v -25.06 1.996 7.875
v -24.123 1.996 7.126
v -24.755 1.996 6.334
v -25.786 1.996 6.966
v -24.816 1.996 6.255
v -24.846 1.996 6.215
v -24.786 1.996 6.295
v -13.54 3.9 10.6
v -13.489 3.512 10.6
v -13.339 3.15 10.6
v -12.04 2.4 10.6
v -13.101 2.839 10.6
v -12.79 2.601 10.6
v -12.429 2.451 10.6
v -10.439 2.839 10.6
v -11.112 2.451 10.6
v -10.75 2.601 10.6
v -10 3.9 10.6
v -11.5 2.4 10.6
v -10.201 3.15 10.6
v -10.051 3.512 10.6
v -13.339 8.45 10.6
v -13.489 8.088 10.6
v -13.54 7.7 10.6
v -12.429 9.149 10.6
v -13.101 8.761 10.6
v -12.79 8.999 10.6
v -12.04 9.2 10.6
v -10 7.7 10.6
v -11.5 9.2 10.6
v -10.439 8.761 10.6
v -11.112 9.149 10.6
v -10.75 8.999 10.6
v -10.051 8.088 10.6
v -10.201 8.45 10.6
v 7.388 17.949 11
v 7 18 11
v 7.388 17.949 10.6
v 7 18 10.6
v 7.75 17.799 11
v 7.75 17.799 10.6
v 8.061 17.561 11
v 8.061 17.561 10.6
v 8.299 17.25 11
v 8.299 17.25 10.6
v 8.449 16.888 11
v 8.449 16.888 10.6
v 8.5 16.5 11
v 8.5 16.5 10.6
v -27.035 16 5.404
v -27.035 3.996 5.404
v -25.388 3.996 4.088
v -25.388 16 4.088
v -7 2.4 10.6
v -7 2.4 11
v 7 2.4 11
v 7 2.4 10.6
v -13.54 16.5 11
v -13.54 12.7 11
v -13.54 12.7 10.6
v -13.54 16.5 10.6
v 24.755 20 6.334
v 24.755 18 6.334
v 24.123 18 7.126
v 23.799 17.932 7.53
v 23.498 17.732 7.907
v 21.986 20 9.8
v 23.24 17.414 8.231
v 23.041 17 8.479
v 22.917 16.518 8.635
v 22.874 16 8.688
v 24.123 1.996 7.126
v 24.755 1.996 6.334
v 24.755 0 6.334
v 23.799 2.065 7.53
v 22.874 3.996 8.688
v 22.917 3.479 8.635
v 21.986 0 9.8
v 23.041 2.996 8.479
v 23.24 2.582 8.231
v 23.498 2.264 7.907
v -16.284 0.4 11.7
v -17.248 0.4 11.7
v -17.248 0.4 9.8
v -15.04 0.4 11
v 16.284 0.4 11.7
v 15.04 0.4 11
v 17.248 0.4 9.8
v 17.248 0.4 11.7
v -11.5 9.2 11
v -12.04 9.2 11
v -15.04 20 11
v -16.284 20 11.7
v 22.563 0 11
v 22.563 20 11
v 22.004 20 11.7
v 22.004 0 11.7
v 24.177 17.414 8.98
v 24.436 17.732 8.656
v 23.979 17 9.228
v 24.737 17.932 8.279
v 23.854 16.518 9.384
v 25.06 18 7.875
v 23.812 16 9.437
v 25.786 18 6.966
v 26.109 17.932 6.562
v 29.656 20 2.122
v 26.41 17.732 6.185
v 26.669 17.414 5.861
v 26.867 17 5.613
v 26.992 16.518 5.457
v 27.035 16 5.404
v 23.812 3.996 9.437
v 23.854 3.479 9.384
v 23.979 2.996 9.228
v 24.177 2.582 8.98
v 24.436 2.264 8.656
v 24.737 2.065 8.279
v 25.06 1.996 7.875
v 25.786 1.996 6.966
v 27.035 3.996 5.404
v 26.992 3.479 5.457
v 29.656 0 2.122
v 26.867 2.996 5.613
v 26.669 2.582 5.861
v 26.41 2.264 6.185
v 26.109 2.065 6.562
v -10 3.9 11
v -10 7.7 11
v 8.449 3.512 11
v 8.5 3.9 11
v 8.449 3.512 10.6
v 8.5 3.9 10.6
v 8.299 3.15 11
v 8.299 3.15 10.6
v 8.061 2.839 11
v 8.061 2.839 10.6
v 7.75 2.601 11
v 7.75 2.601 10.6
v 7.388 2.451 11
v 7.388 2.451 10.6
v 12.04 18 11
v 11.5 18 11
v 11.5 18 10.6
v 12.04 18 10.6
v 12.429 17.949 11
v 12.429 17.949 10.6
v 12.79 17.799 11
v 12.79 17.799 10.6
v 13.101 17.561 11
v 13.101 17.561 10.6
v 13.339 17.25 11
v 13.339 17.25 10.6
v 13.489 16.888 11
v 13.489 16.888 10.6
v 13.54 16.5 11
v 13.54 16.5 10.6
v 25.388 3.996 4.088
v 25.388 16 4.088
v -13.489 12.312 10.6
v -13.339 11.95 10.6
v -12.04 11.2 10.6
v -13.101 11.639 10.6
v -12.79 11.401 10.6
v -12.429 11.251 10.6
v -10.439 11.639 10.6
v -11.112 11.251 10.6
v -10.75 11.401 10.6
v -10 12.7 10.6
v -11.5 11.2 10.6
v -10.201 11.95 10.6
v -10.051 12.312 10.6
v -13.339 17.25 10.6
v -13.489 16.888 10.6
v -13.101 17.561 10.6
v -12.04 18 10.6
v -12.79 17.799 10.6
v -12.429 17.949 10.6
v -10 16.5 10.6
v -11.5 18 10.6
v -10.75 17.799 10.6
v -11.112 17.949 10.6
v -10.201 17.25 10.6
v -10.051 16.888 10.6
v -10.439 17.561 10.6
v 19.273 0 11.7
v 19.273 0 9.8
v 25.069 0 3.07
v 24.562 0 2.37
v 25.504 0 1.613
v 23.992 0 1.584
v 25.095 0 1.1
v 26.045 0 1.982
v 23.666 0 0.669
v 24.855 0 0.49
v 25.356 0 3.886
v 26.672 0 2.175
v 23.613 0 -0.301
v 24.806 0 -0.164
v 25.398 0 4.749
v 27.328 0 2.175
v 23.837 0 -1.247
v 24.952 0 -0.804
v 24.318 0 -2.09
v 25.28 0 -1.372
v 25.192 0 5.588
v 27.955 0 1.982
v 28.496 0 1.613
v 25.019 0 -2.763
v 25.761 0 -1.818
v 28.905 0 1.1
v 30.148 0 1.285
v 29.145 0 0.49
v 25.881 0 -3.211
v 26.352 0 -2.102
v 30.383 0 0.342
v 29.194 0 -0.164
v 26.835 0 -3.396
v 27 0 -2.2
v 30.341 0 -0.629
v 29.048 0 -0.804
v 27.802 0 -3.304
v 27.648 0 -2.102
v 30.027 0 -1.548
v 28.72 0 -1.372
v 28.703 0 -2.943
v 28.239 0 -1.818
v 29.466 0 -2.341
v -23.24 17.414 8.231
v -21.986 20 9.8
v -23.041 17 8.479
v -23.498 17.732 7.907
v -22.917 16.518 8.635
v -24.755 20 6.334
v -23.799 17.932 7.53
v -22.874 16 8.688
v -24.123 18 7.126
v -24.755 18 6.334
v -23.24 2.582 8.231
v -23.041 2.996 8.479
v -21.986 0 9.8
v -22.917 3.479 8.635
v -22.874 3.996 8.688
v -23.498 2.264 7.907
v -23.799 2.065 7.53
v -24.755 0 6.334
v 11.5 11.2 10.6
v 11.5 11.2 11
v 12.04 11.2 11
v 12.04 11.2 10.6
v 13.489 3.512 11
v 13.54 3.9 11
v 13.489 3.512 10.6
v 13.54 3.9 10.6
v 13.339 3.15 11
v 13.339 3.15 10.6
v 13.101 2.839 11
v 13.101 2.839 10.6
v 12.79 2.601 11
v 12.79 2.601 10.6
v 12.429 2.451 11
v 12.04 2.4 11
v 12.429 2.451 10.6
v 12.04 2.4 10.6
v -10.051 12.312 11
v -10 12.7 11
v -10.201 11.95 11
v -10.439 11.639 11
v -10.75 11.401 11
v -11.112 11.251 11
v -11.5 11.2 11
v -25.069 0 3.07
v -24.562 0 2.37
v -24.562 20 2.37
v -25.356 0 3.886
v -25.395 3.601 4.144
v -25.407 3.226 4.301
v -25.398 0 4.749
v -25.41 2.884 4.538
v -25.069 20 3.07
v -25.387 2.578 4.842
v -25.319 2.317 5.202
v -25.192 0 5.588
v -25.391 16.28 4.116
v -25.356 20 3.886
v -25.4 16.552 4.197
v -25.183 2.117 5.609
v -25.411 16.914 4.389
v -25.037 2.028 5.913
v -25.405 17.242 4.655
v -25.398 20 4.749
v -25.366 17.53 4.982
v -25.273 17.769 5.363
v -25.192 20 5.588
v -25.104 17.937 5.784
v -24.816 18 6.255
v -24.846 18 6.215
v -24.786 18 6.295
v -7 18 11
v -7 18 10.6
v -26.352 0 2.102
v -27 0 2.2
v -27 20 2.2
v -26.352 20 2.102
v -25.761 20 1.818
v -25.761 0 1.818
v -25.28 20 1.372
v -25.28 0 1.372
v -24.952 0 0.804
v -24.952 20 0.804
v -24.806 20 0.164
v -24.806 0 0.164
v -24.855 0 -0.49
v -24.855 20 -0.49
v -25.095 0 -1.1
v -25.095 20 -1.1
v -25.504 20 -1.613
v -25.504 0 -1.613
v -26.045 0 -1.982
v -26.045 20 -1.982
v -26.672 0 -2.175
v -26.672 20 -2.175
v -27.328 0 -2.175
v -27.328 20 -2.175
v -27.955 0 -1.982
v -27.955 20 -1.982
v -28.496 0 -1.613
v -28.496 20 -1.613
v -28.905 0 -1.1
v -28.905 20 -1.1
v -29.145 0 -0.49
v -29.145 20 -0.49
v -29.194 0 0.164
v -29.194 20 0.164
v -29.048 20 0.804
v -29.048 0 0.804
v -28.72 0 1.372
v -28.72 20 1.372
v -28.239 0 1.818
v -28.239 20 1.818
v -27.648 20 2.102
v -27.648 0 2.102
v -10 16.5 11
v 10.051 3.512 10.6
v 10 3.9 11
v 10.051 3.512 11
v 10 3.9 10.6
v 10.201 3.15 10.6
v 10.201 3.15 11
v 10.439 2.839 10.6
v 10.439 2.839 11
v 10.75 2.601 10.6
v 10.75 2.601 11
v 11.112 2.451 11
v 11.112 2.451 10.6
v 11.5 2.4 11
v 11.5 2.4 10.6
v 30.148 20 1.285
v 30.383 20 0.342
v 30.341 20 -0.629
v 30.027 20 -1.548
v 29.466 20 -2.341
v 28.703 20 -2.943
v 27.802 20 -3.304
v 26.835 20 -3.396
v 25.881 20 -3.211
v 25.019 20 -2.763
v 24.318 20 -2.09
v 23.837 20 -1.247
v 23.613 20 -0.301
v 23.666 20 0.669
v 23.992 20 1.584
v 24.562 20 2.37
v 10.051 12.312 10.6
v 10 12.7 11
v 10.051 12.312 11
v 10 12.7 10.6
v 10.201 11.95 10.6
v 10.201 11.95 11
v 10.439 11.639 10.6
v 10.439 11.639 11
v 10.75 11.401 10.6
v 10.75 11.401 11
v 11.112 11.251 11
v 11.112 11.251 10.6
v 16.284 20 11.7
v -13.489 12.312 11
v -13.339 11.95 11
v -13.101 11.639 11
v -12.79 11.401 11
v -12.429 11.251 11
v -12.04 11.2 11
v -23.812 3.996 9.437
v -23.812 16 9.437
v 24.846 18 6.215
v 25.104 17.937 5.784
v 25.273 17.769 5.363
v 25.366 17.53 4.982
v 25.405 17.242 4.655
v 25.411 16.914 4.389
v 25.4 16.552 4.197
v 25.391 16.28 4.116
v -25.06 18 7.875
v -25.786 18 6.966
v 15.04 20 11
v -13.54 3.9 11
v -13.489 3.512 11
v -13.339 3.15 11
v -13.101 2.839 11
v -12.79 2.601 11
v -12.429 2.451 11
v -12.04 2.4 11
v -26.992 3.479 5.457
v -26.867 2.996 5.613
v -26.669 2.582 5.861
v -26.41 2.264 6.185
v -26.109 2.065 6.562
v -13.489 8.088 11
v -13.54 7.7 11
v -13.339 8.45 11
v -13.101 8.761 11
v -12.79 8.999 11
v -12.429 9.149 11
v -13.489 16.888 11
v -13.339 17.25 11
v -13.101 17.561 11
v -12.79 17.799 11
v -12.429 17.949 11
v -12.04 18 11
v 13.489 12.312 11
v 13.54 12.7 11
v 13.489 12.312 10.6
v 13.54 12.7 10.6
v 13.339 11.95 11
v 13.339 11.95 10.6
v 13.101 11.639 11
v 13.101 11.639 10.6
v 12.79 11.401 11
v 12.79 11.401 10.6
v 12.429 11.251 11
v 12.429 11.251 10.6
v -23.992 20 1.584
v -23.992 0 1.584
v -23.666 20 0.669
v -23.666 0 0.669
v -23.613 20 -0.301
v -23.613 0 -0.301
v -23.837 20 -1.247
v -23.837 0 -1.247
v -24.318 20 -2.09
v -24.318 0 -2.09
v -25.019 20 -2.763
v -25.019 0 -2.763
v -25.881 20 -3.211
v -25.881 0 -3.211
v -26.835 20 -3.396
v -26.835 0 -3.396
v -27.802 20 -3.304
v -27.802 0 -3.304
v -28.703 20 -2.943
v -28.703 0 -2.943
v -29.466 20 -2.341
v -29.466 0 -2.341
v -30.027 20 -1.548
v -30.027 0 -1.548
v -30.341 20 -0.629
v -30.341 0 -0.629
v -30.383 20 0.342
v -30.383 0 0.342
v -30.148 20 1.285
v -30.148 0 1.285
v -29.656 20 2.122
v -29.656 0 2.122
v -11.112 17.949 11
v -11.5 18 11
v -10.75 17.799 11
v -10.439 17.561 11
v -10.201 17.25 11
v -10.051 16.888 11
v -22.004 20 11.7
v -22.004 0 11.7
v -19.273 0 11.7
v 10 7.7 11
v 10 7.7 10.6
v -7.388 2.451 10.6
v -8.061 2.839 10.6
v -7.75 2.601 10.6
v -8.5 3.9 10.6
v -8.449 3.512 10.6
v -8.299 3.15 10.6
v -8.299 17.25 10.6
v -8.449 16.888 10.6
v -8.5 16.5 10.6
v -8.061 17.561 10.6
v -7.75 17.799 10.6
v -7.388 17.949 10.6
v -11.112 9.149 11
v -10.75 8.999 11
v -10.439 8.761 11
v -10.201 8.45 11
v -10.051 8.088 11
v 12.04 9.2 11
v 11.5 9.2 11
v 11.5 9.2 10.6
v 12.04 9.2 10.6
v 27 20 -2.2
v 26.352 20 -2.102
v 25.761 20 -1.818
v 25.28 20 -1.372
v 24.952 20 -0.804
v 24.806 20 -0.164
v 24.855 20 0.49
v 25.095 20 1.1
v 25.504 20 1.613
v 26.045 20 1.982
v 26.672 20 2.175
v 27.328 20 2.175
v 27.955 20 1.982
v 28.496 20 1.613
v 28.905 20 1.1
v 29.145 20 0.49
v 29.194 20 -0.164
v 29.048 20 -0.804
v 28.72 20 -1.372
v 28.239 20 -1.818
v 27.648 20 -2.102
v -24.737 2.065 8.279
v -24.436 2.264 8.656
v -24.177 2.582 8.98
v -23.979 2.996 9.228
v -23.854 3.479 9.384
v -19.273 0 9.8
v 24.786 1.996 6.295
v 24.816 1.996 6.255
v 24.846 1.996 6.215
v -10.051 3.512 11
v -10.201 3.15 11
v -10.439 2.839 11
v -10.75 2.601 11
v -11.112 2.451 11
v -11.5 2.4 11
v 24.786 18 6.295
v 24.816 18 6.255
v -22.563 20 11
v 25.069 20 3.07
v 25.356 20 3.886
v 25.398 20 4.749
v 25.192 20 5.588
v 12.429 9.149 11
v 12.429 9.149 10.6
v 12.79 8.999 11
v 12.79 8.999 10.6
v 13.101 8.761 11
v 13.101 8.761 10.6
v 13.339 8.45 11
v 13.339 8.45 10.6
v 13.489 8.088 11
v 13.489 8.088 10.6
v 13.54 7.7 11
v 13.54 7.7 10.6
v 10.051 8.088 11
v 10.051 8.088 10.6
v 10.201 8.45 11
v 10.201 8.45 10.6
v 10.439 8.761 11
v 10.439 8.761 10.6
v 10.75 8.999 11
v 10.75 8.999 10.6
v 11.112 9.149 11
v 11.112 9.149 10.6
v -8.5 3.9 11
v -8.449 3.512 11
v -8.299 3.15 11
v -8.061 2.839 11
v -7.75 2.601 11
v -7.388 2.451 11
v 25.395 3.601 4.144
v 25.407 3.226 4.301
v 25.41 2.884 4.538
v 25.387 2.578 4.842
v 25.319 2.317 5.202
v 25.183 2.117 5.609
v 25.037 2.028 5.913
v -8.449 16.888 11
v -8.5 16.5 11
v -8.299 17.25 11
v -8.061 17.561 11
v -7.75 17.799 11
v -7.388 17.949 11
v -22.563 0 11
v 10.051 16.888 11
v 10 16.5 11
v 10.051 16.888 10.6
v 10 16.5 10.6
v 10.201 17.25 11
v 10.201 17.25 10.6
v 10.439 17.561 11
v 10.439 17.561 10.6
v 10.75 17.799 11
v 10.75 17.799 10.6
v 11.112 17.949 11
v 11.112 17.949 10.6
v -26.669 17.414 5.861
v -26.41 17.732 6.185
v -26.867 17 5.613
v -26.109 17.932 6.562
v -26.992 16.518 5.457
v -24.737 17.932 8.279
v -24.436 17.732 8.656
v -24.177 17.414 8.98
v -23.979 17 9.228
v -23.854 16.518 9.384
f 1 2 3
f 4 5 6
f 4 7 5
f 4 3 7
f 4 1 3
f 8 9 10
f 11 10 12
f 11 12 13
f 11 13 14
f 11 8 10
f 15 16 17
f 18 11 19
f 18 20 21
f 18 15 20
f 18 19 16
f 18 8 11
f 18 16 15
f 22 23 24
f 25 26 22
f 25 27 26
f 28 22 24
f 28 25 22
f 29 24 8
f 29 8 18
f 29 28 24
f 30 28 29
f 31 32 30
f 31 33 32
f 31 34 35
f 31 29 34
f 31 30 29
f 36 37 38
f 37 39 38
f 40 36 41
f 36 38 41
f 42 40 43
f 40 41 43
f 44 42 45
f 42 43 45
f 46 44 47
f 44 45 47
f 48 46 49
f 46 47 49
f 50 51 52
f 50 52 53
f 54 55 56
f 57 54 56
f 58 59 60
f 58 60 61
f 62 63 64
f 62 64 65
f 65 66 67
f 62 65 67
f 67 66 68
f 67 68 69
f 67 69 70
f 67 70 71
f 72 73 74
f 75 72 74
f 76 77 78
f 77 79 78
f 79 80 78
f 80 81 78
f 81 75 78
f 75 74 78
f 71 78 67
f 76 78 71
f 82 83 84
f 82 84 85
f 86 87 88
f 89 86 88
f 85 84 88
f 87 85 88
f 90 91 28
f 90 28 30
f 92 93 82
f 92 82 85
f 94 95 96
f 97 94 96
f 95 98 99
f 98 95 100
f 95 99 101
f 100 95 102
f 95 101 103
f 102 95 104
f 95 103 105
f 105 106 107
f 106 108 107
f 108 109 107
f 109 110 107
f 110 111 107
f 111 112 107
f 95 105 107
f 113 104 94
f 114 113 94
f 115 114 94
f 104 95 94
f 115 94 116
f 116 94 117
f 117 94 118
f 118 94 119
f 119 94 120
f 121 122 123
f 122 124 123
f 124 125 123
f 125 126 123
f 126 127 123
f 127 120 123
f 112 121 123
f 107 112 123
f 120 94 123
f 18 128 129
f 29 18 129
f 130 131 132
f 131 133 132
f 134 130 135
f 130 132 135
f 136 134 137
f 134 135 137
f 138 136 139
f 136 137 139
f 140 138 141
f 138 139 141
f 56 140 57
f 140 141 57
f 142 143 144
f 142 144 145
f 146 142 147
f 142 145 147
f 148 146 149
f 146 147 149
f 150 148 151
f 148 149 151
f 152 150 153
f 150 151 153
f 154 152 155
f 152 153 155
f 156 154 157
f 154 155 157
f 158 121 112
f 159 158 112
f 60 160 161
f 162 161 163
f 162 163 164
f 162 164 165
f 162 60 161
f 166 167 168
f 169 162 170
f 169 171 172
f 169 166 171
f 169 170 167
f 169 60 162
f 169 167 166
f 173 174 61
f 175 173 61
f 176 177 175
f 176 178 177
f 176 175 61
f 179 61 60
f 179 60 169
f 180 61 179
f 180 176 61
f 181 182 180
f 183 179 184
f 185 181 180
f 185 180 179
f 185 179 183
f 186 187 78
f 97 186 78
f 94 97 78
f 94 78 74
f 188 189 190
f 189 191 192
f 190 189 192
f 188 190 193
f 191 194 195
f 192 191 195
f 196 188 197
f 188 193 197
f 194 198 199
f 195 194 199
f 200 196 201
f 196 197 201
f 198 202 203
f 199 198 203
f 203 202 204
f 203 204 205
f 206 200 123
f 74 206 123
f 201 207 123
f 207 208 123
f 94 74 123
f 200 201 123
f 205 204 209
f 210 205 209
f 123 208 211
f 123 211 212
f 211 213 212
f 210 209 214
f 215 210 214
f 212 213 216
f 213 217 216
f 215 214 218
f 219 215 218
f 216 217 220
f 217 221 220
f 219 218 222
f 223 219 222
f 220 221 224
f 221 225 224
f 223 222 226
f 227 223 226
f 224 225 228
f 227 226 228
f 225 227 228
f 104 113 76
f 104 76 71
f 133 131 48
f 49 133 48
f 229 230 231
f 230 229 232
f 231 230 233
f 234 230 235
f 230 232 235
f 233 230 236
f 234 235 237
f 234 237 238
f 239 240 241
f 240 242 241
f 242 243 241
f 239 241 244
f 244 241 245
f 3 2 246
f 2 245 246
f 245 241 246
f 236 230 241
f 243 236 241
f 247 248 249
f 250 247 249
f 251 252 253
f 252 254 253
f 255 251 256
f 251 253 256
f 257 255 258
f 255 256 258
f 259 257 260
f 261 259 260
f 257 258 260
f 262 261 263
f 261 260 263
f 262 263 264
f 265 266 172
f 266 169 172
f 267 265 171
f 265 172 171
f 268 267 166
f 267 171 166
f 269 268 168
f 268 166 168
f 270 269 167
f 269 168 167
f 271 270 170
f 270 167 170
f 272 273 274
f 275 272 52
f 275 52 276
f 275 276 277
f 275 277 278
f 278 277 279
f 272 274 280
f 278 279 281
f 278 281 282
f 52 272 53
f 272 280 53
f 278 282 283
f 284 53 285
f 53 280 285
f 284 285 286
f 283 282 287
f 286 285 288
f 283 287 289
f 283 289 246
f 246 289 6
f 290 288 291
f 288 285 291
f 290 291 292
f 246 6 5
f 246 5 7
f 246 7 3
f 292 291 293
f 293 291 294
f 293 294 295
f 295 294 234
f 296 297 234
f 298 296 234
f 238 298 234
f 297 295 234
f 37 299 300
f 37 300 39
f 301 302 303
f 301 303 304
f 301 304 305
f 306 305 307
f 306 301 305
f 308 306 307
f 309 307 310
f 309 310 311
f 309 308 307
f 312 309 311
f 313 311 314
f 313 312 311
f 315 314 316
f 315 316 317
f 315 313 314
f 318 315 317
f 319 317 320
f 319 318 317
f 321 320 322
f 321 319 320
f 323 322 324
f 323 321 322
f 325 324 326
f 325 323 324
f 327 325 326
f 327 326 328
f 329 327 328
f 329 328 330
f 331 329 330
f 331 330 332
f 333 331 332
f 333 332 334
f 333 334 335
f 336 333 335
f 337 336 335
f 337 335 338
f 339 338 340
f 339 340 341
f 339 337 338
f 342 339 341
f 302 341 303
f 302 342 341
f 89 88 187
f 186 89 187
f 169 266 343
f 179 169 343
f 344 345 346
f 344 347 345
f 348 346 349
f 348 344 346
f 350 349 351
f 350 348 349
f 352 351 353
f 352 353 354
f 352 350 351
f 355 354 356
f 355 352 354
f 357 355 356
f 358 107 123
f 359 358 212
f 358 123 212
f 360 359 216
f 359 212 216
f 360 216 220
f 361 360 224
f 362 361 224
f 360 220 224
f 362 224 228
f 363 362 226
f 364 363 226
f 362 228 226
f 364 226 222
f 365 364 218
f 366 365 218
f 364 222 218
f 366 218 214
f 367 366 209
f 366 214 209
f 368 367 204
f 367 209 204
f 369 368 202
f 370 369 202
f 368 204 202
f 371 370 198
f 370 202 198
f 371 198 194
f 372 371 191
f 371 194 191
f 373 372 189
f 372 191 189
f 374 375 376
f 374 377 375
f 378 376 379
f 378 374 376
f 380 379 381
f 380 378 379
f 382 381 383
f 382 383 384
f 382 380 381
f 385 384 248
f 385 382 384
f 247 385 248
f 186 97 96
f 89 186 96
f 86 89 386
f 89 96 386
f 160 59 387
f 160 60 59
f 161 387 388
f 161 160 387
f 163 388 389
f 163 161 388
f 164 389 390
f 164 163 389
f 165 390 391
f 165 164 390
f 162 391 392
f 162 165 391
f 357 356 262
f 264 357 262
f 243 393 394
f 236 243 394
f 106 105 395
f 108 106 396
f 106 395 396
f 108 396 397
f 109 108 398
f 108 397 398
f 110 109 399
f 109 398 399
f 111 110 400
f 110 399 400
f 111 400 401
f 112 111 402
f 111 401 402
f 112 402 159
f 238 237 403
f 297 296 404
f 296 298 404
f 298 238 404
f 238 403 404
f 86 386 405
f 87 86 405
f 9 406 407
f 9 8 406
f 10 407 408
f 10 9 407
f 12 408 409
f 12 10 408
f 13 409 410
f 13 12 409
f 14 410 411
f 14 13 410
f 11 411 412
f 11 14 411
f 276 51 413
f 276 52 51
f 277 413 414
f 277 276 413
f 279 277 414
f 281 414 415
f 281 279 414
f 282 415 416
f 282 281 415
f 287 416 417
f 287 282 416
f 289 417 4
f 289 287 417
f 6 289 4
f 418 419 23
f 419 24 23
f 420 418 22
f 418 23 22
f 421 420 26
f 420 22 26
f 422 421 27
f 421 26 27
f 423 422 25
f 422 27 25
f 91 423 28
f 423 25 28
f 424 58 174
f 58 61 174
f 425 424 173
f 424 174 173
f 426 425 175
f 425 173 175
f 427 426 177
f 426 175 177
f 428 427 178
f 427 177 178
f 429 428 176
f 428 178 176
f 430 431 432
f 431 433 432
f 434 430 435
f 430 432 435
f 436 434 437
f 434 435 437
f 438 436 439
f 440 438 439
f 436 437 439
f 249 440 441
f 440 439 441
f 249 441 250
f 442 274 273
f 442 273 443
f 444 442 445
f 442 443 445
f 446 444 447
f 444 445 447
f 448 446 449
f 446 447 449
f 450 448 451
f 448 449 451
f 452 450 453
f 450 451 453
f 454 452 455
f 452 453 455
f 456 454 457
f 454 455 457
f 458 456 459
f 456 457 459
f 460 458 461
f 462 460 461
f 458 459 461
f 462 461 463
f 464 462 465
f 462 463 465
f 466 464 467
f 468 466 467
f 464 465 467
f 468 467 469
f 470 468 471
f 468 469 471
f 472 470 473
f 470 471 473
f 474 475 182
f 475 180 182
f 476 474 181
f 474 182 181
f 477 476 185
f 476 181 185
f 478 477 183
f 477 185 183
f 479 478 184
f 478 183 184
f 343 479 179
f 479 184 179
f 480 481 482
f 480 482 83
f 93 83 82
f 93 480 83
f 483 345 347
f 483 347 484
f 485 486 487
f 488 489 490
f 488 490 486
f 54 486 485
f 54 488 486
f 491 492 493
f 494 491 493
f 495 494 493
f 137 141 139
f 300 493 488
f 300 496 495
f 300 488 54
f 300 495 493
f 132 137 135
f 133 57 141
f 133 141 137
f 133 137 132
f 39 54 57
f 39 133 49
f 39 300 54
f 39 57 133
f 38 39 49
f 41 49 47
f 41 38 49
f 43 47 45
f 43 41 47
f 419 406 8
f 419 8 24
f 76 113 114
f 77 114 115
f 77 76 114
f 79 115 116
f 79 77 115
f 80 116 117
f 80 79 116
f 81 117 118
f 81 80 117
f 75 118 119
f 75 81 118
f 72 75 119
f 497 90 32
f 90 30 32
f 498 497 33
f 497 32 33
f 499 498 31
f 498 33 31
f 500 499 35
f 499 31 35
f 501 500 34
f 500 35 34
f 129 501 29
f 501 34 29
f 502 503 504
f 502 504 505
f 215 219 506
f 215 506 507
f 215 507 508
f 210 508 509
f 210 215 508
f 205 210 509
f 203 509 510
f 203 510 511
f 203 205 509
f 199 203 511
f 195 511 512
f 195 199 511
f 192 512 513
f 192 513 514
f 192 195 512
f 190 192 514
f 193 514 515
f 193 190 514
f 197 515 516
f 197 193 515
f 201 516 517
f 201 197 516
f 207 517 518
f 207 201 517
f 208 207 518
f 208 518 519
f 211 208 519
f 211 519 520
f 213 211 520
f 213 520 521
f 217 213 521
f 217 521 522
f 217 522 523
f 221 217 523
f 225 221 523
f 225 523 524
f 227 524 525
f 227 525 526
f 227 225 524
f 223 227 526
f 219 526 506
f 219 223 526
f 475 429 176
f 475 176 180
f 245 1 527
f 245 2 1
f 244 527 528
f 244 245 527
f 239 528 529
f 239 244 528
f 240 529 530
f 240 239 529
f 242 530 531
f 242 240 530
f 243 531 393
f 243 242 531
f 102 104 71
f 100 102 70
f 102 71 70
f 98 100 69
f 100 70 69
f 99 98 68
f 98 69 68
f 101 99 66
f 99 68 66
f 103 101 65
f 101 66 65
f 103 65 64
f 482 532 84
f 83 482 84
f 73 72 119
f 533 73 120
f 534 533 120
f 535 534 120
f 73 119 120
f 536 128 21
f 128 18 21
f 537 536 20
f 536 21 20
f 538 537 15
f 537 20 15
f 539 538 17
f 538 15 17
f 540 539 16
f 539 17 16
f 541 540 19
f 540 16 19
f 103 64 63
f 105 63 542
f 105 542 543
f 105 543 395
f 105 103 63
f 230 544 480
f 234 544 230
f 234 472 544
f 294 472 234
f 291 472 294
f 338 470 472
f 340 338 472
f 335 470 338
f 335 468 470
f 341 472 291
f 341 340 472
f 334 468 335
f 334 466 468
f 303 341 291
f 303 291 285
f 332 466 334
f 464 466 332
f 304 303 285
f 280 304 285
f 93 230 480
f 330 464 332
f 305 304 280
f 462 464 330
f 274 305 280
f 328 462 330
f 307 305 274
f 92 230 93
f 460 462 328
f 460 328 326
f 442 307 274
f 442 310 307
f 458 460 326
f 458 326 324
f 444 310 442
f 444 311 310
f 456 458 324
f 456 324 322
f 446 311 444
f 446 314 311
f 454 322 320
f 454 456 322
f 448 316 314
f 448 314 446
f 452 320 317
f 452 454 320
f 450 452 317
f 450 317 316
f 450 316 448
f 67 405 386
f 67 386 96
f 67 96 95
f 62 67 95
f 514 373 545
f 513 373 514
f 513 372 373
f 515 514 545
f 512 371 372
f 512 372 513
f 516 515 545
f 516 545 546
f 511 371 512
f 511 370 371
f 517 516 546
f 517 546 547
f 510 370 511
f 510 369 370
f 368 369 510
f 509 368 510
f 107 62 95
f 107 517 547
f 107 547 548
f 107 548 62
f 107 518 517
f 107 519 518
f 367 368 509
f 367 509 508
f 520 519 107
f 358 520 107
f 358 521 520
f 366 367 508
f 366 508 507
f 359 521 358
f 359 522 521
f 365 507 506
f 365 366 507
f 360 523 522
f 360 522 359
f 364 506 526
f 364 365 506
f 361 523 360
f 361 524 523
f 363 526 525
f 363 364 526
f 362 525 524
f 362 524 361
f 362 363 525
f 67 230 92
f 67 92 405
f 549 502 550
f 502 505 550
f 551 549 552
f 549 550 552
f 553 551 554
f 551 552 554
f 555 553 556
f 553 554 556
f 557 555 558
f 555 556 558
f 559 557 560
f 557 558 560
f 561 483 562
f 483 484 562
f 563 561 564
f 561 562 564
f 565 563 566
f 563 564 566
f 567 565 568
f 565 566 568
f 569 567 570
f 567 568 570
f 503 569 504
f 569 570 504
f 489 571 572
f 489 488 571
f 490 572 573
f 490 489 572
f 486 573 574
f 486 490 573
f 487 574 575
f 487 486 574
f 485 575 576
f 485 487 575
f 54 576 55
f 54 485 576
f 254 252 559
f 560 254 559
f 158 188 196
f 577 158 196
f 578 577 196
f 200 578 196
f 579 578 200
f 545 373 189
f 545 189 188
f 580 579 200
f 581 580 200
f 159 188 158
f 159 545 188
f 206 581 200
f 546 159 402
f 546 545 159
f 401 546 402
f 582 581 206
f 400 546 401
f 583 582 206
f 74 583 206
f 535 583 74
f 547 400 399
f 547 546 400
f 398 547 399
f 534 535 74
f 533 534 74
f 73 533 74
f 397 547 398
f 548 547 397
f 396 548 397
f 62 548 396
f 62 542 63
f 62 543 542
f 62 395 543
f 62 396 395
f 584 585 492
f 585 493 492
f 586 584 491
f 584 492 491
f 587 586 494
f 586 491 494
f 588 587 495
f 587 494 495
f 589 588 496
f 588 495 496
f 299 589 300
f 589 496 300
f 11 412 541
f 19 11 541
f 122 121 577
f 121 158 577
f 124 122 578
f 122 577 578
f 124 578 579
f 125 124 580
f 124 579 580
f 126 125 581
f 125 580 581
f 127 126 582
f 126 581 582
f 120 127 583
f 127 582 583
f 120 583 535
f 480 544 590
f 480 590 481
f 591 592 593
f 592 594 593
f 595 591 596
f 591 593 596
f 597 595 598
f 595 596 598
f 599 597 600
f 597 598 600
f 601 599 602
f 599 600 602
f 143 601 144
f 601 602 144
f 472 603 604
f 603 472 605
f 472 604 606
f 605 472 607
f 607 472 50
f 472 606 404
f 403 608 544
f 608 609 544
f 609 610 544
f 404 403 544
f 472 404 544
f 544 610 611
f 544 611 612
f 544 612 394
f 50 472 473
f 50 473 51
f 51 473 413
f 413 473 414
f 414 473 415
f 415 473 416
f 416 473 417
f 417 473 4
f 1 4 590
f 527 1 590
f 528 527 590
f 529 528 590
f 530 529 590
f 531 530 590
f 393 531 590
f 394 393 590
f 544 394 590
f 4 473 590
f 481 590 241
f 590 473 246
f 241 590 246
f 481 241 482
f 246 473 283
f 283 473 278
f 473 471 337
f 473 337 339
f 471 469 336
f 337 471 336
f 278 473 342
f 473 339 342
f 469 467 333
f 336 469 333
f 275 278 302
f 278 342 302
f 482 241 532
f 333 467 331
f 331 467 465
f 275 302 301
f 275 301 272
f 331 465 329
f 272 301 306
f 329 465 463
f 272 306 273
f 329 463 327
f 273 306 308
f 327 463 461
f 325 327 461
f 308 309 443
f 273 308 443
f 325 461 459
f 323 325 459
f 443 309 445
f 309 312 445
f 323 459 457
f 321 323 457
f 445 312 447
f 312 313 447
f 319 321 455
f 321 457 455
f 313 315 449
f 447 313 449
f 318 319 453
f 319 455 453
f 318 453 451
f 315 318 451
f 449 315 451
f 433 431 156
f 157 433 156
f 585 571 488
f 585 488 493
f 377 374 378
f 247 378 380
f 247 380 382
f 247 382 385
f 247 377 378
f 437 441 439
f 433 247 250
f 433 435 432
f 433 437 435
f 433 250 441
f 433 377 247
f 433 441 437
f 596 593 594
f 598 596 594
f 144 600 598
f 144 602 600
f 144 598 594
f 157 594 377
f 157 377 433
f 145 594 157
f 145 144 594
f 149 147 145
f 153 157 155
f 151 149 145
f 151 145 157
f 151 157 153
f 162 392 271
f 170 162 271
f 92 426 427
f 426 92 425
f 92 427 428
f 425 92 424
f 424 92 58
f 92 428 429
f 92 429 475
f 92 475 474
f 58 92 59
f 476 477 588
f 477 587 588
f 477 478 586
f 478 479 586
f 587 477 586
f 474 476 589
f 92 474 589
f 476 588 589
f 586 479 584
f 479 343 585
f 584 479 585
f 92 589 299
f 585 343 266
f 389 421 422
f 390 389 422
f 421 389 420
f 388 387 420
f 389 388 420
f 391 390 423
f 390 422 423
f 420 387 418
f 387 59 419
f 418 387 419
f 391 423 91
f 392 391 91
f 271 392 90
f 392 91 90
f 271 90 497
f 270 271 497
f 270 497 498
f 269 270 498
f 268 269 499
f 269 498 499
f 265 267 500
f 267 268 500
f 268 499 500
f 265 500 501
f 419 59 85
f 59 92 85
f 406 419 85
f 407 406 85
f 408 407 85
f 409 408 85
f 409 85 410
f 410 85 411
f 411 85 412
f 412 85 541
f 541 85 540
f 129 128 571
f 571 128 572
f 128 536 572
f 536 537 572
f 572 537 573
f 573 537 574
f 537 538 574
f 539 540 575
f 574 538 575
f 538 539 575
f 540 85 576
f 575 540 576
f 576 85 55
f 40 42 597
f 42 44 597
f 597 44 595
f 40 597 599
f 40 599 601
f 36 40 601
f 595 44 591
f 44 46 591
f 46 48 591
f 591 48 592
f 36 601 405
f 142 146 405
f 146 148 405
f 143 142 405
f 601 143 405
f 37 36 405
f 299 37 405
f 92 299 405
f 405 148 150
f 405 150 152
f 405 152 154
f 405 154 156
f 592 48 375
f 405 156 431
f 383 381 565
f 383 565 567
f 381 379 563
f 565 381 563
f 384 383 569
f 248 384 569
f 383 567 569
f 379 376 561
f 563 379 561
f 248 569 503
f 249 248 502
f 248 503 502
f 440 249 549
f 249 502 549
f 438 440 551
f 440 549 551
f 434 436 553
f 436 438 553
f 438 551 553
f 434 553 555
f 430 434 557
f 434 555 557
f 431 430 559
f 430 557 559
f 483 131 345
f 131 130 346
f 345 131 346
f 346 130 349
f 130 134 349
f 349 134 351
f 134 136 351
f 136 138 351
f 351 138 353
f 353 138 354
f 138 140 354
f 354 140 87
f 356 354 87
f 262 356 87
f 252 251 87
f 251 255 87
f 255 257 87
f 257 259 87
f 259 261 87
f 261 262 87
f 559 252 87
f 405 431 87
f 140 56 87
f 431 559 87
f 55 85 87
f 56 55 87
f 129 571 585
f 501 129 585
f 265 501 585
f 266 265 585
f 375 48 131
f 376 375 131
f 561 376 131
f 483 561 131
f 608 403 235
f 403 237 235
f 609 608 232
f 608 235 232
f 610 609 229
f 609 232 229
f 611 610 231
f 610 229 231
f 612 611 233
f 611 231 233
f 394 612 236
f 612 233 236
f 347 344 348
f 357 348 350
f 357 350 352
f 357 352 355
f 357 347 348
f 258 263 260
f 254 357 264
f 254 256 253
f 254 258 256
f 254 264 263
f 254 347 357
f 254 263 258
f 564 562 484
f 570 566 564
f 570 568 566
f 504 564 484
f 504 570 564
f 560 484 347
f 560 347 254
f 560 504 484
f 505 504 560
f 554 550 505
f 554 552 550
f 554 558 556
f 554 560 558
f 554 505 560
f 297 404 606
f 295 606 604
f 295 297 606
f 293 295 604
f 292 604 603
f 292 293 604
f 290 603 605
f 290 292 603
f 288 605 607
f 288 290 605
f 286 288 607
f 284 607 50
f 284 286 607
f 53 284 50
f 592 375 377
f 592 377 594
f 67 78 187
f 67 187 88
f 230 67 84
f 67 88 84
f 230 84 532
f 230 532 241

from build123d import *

# Parameters (mm, degrees)
SKETCH_1_R               = 2.2
EXTRUDE_1_DEPTH          = 20
FILLET_1_R               = 3
SKETCH_3_W               = 5.163325916
SKETCH_3_H               = 16.003609002
CUT_EXTRUDE_2_DEPTH      = 57.596101085
FILLET_2_R               = 2
EXTRUDE_2_DEPTH          = 20
CUT_EXTRUDE_1_DEPTH      = 40.134639439
CUT_EXTRUDE_1_DEPTH_BACK = 40.134639439
SKETCH_5_W               = 17
SKETCH_5_H               = 15.6
SKETCH_5_W_2             = 3.540430575
SKETCH_5_H_2             = 6.8
CUT_EXTRUDE_3_DEPTH      = 0.4
FILLET_3_R               = 1.5


with BuildPart() as part:
    # 草图1 → 凸台-拉伸1 (new body)
    with BuildSketch(Plane(origin=(0, 0, 0), x_dir=(1, 0, 0), z_dir=(0, 1, 0))):
        with BuildLine():
            Line((-29.65627848, -2.122306442), (-22.56320207, -11))
            Line((-22.56320207, -11), (22.56320207, -11))
            Line((22.56320207, -11), (29.65627848, -2.122306442))
            ThreePointArc((29.65627848, -2.122306442), (25.48101359, 3.04182187), (27.10063693, -3.398510293))
            Line((27.10063693, -3.398510293), (21.985991405, -9.8))
            Line((21.985991405, -9.8), (-21.985991405, -9.8))
            Line((-21.985991405, -9.8), (-27.10063693, -3.398510293))
            ThreePointArc((-27.10063693, -3.398510293), (-25.48101359, 3.04182187), (-29.65627848, -2.122306442))
        make_face()
        with Locations(Location((-27, 0, 0), (0, 0, 270))):
            Circle(SKETCH_1_R, mode=Mode.SUBTRACT)
        with Locations(Location((27, 0, 0), (0, 0, 90))):
            Circle(SKETCH_1_R, mode=Mode.SUBTRACT)
    extrude(amount=EXTRUDE_1_DEPTH)

    # 圆角1
    fillet_1_edges = [part.edges().sort_by_distance(p)[0] for p in [
        (-27.10063693, 10, 3.398510293),
        (27.10063693, 10, 3.398510293),
    ]]
    fillet(fillet_1_edges, radius=FILLET_1_R)

    # 草图3 → 切除-拉伸2 (cut, through all)
    with BuildSketch(Plane(origin=(19.136124058, 0, 15.289330416), x_dir=(0.6242077770989366, 0, -0.7812583766009837), z_dir=(0.7812583766009837, 0, 0.6242077770989366))):
        with Locations((10.071947024, 9.998195499)):
            Rectangle(SKETCH_3_W, SKETCH_3_H)
    cut_extrude_2 = extrude(amount=-CUT_EXTRUDE_2_DEPTH, mode=Mode.SUBTRACT)

    # 镜向1: 切除-拉伸2 across plane
    add(cut_extrude_2.mirror(Plane(origin=(0, 0, 0), x_dir=(0, 0, 1), z_dir=(1, 0, 0))), mode=Mode.SUBTRACT)

    # 圆角2
    fillet_2_edges = [part.edges().sort_by_distance(p)[0] for p in [
        (23.342862598, 1.996390998, 9.062958581),
        (26.211335217, 18, 4.745817031),
        (26.211335217, 1.996390998, 4.745817031),
        (23.342862598, 18, 9.062958581),
        (-23.342862598, 18, 9.062958581),
        (-26.211335217, 1.996390998, 4.745817031),
        (-26.211335217, 18, 4.745817031),
        (-23.342862598, 1.996390998, 9.062958581),
    ]]
    fillet(fillet_2_edges, radius=FILLET_2_R)

    # 草图4 → 凸台-拉伸2 (add)
    with BuildSketch(Plane(origin=(0, 20, 0), x_dir=(1, 0, 0), z_dir=(0, 1, 0))):
        Polygon((-22.56320207, -11), (-22.003917898, -11.7), (-16.284224925, -11.7), (-15.040430575, -11), align=None)
        Polygon((15.040430575, -11), (22.56320207, -11), (22.003917898, -11.7), (16.284224925, -11.7), align=None)
    extrude(amount=-EXTRUDE_2_DEPTH)

    # 草图2 → 切除-拉伸1 (cut, two sides: drawn at the far end of the back side and taken through both)
    with BuildSketch(Plane.XY.offset(11).offset(-CUT_EXTRUDE_1_DEPTH_BACK)):
        Polygon((-19.273176969, 0), (-17.2479344, 0.4), (17.2479344, 0.4), (19.273176969, 0), align=None)
    extrude(amount=CUT_EXTRUDE_1_DEPTH + CUT_EXTRUDE_1_DEPTH_BACK, mode=Mode.SUBTRACT)

    # 草图5 → 切除-拉伸3 (cut)
    with BuildSketch(Plane.XY.offset(11)):
        with Locations((0, 10.2)):
            Rectangle(SKETCH_5_W, SKETCH_5_H)
        with Locations((-11.770215288, 14.6)):
            Rectangle(SKETCH_5_W_2, SKETCH_5_H_2)
        with Locations((11.770215288, 14.6)):
            Rectangle(SKETCH_5_W_2, SKETCH_5_H_2)
        with Locations((-11.770215288, 5.8)):
            Rectangle(SKETCH_5_W_2, SKETCH_5_H_2)
        with Locations((11.770215288, 5.8)):
            Rectangle(SKETCH_5_W_2, SKETCH_5_H_2)
    extrude(amount=-CUT_EXTRUDE_3_DEPTH, mode=Mode.SUBTRACT)

    # 圆角3
    fillet_3_edges = [part.edges().sort_by_distance(p)[0] for p in [
        (13.540430575, 2.4, 10.8),
        (10, 2.4, 10.8),
        (10, 9.2, 10.8),
        (13.540430575, 9.2, 10.8),
        (-13.540430575, 2.4, 10.8),
        (-13.540430575, 9.2, 10.8),
        (-10, 9.2, 10.8),
        (-10, 2.4, 10.8),
        (13.540430575, 18, 10.8),
        (13.540430575, 11.2, 10.8),
        (10, 11.2, 10.8),
        (10, 18, 10.8),
        (-10, 18, 10.8),
        (-10, 11.2, 10.8),
        (-13.540430575, 11.2, 10.8),
        (-13.540430575, 18, 10.8),
        (8.5, 18, 10.8),
        (8.5, 2.4, 10.8),
        (-8.5, 2.4, 10.8),
        (-8.5, 18, 10.8),
    ]]
    fillet(fillet_3_edges, radius=FILLET_3_R)


solid = part.part
